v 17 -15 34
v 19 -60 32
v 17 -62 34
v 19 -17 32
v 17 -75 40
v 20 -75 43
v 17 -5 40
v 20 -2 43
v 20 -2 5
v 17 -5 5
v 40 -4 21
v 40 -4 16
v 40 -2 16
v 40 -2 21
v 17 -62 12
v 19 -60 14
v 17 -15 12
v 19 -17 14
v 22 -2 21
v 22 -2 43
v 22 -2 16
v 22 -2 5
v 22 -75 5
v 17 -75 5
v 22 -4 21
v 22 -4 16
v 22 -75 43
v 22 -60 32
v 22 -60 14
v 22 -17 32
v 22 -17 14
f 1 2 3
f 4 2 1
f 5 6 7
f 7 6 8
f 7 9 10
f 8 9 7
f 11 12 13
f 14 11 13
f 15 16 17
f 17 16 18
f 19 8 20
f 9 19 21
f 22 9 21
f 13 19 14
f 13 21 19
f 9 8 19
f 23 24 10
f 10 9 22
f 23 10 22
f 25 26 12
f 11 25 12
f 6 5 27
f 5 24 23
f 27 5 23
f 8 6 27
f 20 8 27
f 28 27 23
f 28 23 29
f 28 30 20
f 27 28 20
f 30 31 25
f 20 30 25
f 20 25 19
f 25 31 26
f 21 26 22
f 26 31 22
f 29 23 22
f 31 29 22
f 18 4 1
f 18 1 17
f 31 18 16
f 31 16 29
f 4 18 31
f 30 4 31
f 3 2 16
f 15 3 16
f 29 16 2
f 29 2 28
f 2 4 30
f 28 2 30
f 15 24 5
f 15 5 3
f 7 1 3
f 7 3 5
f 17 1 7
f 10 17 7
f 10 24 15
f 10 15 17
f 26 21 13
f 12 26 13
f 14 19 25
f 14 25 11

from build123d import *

# Parameters (mm, degrees)
BOX012_W        = 20
BOX012_H        = 2
BOX012_DEPTH    = 5
BOX011_W        = 7
BOX011_H        = 43
BOX011_DEPTH    = 18
BOX010_W        = 5
BOX010_H        = 73
BOX010_DEPTH    = 38
CHAMFER002_SIZE = 3
CHAMFER003_SIZE = 2


with BuildPart() as cube004:
    # Box012 → Box012 (new body)
    with BuildSketch(Plane(origin=(20, -4, 16), x_dir=(1, 0, 0), z_dir=(0, 0, 1))):
        with Locations((10, 1)):
            Rectangle(BOX012_W, BOX012_H)
    extrude(amount=BOX012_DEPTH)


with BuildPart() as restriccion_lipo001:
    # Box011 → Box011 (new body)
    with BuildSketch(Plane(origin=(16, -60, 14), x_dir=(1, 0, 0), z_dir=(0, 0, 1))):
        with Locations((3.5, 21.5)):
            Rectangle(BOX011_W, BOX011_H)
    extrude(amount=BOX011_DEPTH)


with BuildPart() as rejillas_lipo:
    # Box010 → Box010 (new body)
    with BuildSketch(Plane(origin=(17, -75, 5), x_dir=(1, 0, 0), z_dir=(0, 0, 1))):
        with Locations((2.5, 36.5)):
            Rectangle(BOX010_W, BOX010_H)
    extrude(amount=BOX010_DEPTH)

    # Cut028: cut restriccion-lipo001
    add(restriccion_lipo001.part, mode=Mode.SUBTRACT)

    # Chamfer002
    chamfer002_edges = [rejillas_lipo.edges().sort_by_distance(p)[0] for p in [
        (17, -38.5, 43),
        (17, -2, 24),
    ]]
    chamfer(chamfer002_edges, length=CHAMFER002_SIZE)

    # Chamfer003
    chamfer003_edges = [rejillas_lipo.edges().sort_by_distance(p)[0] for p in [
        (17, -38.5, 14),
        (17, -17, 23),
        (17, -38.5, 32),
        (17, -60, 23),
    ]]
    chamfer(chamfer003_edges, length=CHAMFER003_SIZE)

    # Fusion001032: union Cube004
    add(cube004.part)


solid = rejillas_lipo.part
